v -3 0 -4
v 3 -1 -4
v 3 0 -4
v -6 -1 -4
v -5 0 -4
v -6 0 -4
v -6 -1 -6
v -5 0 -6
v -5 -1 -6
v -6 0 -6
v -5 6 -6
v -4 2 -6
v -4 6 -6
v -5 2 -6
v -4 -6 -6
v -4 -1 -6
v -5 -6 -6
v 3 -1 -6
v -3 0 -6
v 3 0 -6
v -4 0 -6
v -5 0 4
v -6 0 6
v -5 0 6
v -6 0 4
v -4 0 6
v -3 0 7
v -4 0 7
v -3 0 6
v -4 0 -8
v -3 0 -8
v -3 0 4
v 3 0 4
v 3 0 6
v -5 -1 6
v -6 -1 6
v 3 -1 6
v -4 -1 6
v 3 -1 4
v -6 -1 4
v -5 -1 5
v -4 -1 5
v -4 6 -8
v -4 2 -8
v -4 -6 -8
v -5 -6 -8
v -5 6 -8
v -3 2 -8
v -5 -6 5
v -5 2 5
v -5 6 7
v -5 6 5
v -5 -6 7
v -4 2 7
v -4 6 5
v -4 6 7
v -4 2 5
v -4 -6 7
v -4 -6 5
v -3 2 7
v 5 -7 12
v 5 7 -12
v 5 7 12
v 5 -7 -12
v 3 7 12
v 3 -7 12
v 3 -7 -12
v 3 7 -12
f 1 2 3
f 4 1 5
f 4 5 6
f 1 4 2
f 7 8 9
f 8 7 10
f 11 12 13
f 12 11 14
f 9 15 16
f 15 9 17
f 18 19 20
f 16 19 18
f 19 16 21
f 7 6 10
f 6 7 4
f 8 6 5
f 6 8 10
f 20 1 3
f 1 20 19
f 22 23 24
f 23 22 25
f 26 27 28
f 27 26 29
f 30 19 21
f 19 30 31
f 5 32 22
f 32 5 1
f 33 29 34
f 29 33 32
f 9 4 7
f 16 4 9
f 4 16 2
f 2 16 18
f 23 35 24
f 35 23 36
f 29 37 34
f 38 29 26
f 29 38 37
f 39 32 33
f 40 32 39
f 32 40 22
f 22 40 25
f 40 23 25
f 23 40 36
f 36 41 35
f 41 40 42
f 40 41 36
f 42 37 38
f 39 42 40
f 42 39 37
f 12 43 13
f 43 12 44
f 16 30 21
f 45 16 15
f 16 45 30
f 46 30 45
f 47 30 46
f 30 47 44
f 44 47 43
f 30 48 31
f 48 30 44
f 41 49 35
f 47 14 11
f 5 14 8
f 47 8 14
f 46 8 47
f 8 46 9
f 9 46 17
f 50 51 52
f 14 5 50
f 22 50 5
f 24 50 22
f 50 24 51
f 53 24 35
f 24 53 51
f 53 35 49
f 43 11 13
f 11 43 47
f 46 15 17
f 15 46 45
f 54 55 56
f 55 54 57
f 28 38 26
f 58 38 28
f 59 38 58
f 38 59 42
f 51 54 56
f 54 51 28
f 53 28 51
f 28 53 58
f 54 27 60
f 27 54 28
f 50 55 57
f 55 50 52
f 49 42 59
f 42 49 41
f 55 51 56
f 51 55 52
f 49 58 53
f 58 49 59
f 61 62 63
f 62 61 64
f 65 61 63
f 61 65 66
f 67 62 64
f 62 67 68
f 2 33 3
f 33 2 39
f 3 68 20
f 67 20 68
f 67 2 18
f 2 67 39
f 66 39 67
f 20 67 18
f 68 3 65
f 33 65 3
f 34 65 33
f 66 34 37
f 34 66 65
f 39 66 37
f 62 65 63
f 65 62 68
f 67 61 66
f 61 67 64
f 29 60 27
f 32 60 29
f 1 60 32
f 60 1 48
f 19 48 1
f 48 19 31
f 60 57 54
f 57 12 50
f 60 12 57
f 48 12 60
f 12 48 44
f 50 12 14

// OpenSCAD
//draw('Top','Rect',P=(4,0,0),G=(2,7,12))

translate([4,0,0]) {
    cube([2,14,24],true);
}

//for(i<2,'Trans',u=(0,0,10))
//draw('Leg','Cub',P=(-6,-1,-6)
//+(i×u),G=(10,1,2))

translate([-6,-1,-6]) {
    cube([10,1,2]);
    translate([0,0,10]) {
        cube([10,1,2]);
    }
}

//for(i<2,'Trans',u=(0,0,13))
//draw('HoriBar','Cub',P=(-5,-6,-8)
//+(i×u),G=(1,12,2))

translate([-5,-6,-8]) {
    cube([1,12,2]);
    translate([0,0,13]) {
        cube([1,12,2]);
    }
}

//draw('HoriBar','Cub',P=(-5,0,-8),G=(2,2,15))
translate([-5,0,-8]) {
    cube([2,2,15]);
}
